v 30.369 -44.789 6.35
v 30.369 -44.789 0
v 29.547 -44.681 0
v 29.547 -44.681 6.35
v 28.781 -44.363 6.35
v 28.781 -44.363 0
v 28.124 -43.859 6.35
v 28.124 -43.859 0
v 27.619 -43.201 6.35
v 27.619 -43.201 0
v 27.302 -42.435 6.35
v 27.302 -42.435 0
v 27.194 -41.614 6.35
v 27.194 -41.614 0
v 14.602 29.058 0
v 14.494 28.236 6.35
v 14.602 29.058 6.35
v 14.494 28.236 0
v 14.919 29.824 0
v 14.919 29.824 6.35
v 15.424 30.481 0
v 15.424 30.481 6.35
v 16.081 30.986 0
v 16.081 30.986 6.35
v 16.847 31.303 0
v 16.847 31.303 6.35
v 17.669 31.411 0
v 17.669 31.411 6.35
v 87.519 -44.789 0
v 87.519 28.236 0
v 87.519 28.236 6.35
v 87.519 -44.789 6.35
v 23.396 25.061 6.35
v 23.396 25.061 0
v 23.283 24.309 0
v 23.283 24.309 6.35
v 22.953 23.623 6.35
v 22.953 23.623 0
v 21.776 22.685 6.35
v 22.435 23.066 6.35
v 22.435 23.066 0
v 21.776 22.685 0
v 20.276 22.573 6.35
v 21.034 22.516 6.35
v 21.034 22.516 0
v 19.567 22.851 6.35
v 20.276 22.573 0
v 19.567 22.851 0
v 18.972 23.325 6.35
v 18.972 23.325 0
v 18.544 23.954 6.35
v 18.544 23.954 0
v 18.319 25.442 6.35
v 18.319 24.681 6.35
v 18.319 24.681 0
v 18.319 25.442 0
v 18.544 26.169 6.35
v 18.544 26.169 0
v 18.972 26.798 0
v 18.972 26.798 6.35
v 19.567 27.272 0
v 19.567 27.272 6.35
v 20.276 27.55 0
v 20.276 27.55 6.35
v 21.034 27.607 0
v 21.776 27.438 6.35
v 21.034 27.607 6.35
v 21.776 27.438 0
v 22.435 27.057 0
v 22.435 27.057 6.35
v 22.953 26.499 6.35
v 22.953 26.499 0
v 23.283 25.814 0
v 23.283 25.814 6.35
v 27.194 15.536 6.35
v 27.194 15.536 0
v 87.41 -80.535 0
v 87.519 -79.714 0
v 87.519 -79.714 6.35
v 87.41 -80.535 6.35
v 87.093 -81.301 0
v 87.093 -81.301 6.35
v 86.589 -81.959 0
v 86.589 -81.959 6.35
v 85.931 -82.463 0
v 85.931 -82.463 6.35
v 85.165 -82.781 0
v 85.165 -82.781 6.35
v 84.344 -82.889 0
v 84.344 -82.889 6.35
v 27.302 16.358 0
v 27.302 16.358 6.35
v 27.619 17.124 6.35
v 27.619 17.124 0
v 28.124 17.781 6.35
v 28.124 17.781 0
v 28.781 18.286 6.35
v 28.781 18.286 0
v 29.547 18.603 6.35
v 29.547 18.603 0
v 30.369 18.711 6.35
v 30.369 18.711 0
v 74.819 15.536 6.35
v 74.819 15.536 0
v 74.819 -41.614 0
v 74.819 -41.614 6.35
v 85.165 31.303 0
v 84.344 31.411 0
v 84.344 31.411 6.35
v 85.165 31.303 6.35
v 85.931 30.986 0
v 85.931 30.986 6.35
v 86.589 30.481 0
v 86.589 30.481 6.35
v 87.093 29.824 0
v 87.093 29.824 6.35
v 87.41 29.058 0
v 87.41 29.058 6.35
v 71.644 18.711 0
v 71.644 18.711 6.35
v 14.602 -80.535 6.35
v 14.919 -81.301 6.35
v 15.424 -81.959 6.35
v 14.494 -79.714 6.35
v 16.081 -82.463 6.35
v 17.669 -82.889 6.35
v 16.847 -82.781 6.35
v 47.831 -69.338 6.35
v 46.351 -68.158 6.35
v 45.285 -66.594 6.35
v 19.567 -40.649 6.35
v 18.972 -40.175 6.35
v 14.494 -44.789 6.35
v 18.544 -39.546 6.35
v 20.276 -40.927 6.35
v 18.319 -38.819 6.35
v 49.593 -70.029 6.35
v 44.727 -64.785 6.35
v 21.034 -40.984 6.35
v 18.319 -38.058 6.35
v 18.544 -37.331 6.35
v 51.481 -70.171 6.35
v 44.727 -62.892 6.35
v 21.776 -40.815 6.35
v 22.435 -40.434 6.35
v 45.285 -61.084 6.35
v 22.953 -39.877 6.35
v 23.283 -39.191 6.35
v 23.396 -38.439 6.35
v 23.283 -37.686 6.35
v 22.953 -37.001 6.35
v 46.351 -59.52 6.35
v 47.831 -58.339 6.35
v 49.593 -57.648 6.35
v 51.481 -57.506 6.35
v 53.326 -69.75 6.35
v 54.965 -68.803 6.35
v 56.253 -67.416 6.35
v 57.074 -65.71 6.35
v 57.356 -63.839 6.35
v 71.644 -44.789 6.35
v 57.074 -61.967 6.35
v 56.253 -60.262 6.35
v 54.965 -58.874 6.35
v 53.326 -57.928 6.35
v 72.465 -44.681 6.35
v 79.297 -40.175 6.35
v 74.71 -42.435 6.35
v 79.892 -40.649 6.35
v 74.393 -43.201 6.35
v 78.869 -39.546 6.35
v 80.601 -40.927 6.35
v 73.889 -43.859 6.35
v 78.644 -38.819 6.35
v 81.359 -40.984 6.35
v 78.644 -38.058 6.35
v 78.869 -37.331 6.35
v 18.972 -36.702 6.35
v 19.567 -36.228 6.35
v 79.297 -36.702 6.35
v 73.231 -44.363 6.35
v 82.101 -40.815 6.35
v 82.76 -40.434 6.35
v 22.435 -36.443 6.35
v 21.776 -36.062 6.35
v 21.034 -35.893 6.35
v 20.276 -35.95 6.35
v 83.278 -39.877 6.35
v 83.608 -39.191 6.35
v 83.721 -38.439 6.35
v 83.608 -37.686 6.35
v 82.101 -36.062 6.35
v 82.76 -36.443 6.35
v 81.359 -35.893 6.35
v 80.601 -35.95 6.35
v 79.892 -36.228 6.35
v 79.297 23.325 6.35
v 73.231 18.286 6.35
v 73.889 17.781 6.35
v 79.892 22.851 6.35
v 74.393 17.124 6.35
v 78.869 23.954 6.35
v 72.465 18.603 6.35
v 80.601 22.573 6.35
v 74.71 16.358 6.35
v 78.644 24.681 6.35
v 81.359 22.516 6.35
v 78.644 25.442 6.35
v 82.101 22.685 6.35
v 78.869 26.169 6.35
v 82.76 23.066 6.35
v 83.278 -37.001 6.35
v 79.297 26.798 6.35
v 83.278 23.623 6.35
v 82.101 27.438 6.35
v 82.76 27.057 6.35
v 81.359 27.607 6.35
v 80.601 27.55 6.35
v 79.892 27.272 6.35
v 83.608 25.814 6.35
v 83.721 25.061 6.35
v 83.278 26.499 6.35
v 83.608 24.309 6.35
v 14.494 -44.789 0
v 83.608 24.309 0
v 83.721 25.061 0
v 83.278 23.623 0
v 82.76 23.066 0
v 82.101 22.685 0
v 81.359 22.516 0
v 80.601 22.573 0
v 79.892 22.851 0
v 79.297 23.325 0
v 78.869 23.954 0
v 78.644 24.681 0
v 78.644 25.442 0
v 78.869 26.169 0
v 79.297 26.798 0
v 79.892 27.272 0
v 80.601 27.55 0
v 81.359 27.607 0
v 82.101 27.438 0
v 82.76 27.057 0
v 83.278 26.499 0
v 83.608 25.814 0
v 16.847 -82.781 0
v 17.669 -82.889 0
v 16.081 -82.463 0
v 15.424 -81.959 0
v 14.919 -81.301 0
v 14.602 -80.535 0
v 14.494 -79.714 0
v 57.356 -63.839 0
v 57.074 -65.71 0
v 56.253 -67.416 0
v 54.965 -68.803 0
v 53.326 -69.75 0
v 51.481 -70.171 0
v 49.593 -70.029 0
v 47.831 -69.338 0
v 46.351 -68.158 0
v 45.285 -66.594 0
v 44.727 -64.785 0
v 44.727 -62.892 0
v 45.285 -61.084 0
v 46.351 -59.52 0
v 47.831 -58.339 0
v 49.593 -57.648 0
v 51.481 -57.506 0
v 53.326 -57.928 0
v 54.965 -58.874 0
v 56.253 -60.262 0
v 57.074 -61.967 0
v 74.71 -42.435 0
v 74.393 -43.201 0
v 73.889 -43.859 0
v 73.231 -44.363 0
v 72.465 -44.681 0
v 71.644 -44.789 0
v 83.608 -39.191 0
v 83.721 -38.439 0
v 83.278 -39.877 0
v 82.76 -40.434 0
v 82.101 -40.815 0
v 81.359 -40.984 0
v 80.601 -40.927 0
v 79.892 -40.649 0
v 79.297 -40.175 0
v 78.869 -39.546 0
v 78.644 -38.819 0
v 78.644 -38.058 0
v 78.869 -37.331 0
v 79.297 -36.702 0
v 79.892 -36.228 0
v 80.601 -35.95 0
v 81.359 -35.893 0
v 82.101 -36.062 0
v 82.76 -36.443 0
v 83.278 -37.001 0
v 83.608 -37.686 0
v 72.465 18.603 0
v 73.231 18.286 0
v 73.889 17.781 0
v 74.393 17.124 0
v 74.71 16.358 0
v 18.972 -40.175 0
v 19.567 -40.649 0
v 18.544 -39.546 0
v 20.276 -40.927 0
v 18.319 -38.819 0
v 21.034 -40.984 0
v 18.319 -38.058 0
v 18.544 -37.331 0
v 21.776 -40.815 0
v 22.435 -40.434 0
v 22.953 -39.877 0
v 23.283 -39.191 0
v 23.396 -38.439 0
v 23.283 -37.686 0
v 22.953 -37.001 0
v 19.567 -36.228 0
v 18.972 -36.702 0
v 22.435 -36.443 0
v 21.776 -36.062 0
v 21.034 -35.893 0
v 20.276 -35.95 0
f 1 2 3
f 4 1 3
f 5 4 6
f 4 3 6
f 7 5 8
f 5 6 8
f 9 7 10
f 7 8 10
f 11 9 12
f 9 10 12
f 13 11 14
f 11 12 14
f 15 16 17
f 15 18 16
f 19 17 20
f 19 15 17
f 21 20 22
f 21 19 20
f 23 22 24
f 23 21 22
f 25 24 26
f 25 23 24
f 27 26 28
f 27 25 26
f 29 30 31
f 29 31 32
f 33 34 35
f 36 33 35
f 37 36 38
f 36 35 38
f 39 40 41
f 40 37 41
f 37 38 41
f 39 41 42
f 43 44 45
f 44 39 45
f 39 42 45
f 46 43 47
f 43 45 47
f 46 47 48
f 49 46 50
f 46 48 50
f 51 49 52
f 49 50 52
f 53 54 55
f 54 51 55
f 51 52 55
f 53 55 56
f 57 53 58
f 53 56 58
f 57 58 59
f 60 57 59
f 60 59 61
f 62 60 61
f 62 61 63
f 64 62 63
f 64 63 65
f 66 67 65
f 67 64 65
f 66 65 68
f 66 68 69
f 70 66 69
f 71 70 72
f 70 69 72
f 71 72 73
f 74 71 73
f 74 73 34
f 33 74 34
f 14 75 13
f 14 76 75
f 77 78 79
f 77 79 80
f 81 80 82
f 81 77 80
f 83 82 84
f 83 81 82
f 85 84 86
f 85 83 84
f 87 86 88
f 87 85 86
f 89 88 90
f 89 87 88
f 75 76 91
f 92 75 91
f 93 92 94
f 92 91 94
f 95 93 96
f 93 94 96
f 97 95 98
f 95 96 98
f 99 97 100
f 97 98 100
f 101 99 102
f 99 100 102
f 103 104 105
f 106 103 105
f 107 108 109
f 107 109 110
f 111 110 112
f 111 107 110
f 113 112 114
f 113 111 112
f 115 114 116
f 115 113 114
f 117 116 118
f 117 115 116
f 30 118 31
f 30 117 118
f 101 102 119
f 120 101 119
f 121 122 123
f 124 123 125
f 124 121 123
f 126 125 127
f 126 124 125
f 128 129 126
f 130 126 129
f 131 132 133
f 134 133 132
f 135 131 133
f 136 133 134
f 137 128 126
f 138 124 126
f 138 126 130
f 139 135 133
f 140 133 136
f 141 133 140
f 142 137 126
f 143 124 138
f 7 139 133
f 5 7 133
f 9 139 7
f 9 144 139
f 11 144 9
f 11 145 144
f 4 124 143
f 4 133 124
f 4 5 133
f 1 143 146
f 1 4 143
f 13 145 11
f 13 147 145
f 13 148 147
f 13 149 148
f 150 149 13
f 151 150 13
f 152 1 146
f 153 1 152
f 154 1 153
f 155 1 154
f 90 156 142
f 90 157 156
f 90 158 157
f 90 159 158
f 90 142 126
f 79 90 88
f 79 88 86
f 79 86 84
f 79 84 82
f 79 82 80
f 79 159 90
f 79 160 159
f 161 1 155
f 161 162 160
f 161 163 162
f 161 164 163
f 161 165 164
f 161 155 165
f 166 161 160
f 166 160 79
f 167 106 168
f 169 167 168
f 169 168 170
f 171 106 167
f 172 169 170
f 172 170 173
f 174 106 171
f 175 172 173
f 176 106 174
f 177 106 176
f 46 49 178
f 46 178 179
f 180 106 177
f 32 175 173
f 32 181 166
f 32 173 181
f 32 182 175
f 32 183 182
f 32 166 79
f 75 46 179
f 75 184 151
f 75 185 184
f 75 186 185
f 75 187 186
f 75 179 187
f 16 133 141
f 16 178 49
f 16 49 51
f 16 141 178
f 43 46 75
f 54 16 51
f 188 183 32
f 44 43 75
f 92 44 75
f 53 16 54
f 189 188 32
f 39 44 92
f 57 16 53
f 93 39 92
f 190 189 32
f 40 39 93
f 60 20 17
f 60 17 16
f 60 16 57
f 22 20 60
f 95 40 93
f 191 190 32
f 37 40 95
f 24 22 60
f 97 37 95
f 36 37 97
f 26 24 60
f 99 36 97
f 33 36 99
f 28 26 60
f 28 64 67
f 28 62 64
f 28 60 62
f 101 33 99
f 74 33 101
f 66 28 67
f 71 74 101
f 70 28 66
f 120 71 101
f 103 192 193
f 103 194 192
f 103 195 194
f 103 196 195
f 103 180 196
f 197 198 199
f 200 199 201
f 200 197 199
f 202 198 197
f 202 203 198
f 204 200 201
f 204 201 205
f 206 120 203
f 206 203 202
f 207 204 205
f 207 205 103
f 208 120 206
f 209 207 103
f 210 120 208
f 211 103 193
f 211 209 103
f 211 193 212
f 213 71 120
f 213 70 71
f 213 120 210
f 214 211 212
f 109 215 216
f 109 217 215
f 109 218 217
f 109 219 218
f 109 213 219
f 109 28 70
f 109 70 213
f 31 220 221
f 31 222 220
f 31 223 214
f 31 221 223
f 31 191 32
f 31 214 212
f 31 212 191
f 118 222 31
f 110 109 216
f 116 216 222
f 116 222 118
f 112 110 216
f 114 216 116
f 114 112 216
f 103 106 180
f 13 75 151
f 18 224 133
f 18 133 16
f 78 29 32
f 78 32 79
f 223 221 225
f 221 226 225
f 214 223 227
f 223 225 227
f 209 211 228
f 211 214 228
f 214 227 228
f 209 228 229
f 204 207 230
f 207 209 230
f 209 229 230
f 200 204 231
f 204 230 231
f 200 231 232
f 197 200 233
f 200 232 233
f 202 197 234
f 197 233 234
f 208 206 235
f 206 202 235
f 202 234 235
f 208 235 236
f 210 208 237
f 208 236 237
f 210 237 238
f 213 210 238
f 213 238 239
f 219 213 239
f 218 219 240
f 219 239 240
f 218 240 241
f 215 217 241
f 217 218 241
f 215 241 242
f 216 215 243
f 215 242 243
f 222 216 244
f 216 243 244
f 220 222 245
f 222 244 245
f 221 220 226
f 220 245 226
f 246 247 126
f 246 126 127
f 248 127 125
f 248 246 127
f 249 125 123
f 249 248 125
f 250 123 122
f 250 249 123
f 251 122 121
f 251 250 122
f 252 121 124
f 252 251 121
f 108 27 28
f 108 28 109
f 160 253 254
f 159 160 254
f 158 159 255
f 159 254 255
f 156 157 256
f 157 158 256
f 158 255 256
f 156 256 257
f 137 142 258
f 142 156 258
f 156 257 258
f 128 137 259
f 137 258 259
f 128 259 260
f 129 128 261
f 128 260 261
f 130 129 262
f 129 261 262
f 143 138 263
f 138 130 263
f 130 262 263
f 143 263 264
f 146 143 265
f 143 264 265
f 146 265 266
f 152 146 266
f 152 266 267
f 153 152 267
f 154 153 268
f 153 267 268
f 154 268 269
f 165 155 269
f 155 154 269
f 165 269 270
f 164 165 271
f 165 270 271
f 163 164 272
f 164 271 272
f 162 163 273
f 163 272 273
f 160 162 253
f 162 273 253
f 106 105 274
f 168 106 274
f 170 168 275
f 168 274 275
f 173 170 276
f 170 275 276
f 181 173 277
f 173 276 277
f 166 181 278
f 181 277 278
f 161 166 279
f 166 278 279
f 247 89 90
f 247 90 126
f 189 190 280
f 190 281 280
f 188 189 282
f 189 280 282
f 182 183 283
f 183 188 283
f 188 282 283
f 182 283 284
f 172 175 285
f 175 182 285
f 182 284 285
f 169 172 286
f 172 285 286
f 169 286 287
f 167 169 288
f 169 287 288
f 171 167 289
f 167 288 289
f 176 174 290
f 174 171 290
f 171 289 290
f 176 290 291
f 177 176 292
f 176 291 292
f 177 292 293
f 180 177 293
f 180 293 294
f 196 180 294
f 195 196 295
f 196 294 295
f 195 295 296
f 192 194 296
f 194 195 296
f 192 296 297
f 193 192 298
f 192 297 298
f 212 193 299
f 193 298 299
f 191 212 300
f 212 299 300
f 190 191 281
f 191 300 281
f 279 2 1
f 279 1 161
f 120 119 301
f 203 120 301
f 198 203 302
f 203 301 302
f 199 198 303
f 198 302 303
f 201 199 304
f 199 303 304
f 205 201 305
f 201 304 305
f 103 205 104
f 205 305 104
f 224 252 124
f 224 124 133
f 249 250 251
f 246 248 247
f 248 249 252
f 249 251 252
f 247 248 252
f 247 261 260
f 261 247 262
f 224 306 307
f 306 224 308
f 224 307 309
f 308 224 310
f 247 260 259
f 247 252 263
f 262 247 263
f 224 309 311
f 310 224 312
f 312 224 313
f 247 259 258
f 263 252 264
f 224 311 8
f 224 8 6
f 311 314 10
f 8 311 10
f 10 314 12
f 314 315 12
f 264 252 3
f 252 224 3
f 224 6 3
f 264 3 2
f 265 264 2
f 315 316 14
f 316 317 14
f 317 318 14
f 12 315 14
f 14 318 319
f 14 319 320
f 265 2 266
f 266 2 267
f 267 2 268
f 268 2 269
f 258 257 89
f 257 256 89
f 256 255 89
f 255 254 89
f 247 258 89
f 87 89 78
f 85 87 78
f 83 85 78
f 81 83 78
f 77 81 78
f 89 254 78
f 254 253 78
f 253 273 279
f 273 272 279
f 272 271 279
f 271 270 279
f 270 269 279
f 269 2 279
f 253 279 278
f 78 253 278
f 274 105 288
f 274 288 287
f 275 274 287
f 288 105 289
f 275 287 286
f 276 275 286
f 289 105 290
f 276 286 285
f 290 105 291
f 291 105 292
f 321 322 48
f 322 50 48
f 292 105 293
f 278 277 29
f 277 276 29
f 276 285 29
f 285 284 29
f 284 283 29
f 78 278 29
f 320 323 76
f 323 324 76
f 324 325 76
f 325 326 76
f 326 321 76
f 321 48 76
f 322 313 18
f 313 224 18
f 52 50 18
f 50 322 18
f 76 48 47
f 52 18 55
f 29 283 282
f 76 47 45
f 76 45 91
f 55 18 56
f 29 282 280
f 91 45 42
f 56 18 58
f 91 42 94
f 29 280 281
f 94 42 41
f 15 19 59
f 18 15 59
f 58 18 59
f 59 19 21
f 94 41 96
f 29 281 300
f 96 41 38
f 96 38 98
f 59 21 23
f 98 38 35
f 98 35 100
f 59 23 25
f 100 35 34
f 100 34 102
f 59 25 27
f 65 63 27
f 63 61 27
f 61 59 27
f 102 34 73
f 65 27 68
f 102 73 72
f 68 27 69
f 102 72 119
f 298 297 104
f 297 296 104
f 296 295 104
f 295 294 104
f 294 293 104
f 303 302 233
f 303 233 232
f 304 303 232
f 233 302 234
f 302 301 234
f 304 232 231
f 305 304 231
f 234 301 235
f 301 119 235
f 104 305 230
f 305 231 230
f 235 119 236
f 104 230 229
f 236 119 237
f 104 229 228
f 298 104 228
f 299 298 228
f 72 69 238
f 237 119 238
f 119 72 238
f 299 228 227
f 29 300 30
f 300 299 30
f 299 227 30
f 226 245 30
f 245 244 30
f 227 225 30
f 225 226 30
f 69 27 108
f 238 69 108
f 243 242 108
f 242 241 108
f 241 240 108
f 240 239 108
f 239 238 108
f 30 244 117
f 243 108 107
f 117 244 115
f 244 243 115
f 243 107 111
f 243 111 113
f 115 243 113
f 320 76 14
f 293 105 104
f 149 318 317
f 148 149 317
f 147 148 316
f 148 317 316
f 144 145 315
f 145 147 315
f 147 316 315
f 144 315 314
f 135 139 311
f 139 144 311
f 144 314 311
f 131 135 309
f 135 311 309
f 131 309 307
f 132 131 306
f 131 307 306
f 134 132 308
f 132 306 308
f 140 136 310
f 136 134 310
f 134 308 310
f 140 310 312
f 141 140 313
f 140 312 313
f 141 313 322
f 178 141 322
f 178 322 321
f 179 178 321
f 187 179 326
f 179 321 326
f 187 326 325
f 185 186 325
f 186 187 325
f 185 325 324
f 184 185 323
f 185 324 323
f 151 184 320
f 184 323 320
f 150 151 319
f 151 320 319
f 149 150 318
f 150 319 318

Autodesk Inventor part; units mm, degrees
ref_plane "YZ Plane" through (0, 0, 0) normal (1, 0, 0) x (0, 1, 0)
ref_plane "XZ Plane" through (0, 0, 0) normal (0, 1, 0) x (-1, 0, 0)
ref_plane "XY Plane" through (0, 0, 0) normal (0, 0, 1) x (1, 0, 0)
sketch "Sketch1" plane through (0, 0, 0) normal (0, 0, 1) x (1, 0, 0)
  line L0 (17.6686, 31.4113) -> (84.3436, 31.4113)
  line L1 (87.5186, 28.2363) -> (87.5186, -44.7887)
  line L2 (14.4936, -44.7887) -> (14.4936, 28.2363)
  line L3 (30.3686, 18.7113) -> (71.6436, 18.7113)
  line L4 (74.8186, 15.5363) -> (74.8186, -41.6137)
  line L5 (27.1936, 15.5363) -> (27.1936, -41.6137)
  circle A0 centre (20.8436, 25.0613) radius 2.5527
  circle A1 centre (81.1686, 25.0613) radius 2.5527
  arc A2 (17.6686, 31.4113) -> (14.4936, 28.2363) centre (17.6686, 28.2363) ccw
  arc A3 (87.5186, 28.2363) -> (84.3436, 31.4113) centre (84.3436, 28.2363) ccw
  circle A4 centre (20.8436, -38.4387) radius 2.5527
  circle A5 centre (81.1686, -38.4387) radius 2.5527
  line L6 (30.3686, -44.7887) -> (71.6436, -44.7887)
  line L7 (87.5186, -44.7887) -> (87.5186, -79.7137)
  line L8 (84.3436, -82.8887) -> (17.6686, -82.8887)
  line L9 (14.4936, -79.7137) -> (14.4936, -44.7887)
  circle A6 centre (51.0061, -63.8387) radius 6.35
  arc A7 (14.4936, -79.7137) -> (17.6686, -82.8887) centre (17.6686, -79.7137) ccw
  arc A8 (84.3436, -82.8887) -> (87.5186, -79.7137) centre (84.3436, -79.7137) ccw
  arc A9 (71.6436, -44.7887) -> (74.8186, -41.6137) centre (71.6436, -41.6137) ccw
  arc A10 (27.1936, -41.6137) -> (30.3686, -44.7887) centre (30.3686, -41.6137) ccw
  arc A11 (30.3686, 18.7113) -> (27.1936, 15.5363) centre (30.3686, 15.5363) ccw
  arc A12 (74.8186, 15.5363) -> (71.6436, 18.7113) centre (71.6436, 15.5363) ccw
  point P0 (0, 0)
  point P1 (87.5186, 31.4113)
  dimension "d1" = 76.2
  dimension "d2" = 73.025
  dimension "d3" = 12.7
  dimension "d4" = 12.7
  dimension "d5" = 12.7
  dimension "d6" = 5.1054
  dimension "d7" = 6.35
  dimension "d9" = 5.1054
  dimension "d10" = 6.35
  dimension "d11" = 6.35
  dimension "d12" = 3.175
  dimension "d13" = 5.1054
  dimension "d14" = 5.1054
  dimension "d15" = 63.5
  dimension "d16" = 63.5
  dimension "d17" = 76.2
  dimension "d18" = 12.7
  dimension "d19" = 36.5125
  dimension "d20" = 38.1
  dimension "d21" = 19.05
  dimension "d22" = 3.175
  dimension "d23" = 3.175
  dimension "d26" = 60.325
  dimension "d27" = 0
extrude "Extrusion1" add sketch "Sketch1" along normal blind 6.35
properties part number "2 Stage Climber in a box bracket"
